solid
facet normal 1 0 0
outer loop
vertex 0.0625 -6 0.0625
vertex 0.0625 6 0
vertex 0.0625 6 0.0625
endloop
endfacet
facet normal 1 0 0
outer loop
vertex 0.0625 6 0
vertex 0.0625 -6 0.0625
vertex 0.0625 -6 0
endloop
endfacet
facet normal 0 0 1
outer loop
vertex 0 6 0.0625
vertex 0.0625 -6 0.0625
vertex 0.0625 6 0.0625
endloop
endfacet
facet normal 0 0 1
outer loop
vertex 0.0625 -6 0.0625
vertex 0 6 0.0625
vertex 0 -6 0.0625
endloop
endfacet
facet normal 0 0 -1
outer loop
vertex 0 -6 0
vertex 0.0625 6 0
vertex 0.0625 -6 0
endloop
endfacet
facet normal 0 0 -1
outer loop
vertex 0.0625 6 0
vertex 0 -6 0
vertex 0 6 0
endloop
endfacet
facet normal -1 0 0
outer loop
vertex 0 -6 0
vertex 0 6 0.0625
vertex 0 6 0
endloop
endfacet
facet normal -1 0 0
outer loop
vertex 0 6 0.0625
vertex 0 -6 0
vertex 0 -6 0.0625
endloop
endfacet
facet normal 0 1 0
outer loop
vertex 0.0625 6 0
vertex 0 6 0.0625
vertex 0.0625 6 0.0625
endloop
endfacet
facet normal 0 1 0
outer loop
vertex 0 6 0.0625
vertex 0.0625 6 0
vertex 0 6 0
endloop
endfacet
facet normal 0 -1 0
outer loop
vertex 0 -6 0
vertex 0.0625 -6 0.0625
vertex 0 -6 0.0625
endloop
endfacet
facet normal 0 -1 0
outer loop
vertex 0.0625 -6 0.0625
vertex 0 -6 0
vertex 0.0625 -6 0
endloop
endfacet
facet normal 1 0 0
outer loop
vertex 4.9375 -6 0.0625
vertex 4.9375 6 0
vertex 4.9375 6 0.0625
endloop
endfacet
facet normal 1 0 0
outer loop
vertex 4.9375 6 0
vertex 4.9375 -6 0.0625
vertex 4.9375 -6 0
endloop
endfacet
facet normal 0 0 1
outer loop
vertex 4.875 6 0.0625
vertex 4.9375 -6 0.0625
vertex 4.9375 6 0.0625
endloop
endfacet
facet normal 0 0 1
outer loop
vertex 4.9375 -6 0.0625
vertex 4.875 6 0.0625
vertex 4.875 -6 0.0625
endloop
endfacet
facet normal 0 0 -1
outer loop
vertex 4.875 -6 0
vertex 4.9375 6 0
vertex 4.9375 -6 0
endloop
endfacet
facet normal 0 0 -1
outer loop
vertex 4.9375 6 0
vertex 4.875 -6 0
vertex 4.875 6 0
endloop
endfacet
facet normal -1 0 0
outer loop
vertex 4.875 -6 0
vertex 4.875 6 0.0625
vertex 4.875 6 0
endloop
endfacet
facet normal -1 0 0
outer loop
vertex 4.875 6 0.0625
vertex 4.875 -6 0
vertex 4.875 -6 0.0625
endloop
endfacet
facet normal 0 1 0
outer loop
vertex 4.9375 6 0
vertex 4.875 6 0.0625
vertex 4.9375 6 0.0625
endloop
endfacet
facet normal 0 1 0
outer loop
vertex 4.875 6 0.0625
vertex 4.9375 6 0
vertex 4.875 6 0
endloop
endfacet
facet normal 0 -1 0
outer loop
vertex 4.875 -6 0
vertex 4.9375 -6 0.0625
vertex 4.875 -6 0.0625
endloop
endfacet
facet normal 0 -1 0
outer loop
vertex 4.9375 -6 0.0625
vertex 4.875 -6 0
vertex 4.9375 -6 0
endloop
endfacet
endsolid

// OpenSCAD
// file: rib.scad
module rib(
      chord=5,
      camber=6,
      height=1/16,
      thickness=1/32) {
    camber = camber * chord / 100;
    radius = chord * chord / (8 * camber) + camber / 2;

    rotate([90,0,0])
      translate([chord/2,-radius + camber + height,-thickness/2])
        intersection() {
          difference() {
            cylinder(r=radius,h=thickness, $fn=100);
            translate([0,0,-0.5])
                cylinder(r=radius-height, h=1, $fn=100);
          }
          translate([-chord/2,radius-camber-height,0])
            cube([chord, 1, 1]);
        }
}

rib();
// main file
use <rib.scad>

module wing_spar(
    span,
    le_thickness,
    le_height) {
     cube([
      le_thickness,
      span,
      le_height]);
}

module wing_rib(
    chord,
    camber,
    thickness,
    height,
    le_thickness,
    te_thickness) {
  ribchord = chord
    - le_thickness
    - te_thickness;
  rib(
    ribchord,
    camber,
    thickness,
    height
  );
}

module wing_center(
    chord=5,
    span=12,
    nribs=5,
    camber=5,
    height=1/16,
    thickness=1/16) {

  // leading edge
  translate([0,-span/2,0])
    wing_spar(span, height, thickness);

  // place ribs
  for (n=[0:1:nribs-1]) {
    offset = -span/2 + span
        /(nribs-1) * n;
    translate(
      [thickness,offset,0]
    )
      wing_rib(
        chord - 2 * thickness,
        camber,
        thickness,
        height
      );
    }

  // trailing edge
    translate([
      chord  -2 * thickness,
      -span/2,
      0
    ])
      wing_spar(span, thickness, height);
}

wing_center();
